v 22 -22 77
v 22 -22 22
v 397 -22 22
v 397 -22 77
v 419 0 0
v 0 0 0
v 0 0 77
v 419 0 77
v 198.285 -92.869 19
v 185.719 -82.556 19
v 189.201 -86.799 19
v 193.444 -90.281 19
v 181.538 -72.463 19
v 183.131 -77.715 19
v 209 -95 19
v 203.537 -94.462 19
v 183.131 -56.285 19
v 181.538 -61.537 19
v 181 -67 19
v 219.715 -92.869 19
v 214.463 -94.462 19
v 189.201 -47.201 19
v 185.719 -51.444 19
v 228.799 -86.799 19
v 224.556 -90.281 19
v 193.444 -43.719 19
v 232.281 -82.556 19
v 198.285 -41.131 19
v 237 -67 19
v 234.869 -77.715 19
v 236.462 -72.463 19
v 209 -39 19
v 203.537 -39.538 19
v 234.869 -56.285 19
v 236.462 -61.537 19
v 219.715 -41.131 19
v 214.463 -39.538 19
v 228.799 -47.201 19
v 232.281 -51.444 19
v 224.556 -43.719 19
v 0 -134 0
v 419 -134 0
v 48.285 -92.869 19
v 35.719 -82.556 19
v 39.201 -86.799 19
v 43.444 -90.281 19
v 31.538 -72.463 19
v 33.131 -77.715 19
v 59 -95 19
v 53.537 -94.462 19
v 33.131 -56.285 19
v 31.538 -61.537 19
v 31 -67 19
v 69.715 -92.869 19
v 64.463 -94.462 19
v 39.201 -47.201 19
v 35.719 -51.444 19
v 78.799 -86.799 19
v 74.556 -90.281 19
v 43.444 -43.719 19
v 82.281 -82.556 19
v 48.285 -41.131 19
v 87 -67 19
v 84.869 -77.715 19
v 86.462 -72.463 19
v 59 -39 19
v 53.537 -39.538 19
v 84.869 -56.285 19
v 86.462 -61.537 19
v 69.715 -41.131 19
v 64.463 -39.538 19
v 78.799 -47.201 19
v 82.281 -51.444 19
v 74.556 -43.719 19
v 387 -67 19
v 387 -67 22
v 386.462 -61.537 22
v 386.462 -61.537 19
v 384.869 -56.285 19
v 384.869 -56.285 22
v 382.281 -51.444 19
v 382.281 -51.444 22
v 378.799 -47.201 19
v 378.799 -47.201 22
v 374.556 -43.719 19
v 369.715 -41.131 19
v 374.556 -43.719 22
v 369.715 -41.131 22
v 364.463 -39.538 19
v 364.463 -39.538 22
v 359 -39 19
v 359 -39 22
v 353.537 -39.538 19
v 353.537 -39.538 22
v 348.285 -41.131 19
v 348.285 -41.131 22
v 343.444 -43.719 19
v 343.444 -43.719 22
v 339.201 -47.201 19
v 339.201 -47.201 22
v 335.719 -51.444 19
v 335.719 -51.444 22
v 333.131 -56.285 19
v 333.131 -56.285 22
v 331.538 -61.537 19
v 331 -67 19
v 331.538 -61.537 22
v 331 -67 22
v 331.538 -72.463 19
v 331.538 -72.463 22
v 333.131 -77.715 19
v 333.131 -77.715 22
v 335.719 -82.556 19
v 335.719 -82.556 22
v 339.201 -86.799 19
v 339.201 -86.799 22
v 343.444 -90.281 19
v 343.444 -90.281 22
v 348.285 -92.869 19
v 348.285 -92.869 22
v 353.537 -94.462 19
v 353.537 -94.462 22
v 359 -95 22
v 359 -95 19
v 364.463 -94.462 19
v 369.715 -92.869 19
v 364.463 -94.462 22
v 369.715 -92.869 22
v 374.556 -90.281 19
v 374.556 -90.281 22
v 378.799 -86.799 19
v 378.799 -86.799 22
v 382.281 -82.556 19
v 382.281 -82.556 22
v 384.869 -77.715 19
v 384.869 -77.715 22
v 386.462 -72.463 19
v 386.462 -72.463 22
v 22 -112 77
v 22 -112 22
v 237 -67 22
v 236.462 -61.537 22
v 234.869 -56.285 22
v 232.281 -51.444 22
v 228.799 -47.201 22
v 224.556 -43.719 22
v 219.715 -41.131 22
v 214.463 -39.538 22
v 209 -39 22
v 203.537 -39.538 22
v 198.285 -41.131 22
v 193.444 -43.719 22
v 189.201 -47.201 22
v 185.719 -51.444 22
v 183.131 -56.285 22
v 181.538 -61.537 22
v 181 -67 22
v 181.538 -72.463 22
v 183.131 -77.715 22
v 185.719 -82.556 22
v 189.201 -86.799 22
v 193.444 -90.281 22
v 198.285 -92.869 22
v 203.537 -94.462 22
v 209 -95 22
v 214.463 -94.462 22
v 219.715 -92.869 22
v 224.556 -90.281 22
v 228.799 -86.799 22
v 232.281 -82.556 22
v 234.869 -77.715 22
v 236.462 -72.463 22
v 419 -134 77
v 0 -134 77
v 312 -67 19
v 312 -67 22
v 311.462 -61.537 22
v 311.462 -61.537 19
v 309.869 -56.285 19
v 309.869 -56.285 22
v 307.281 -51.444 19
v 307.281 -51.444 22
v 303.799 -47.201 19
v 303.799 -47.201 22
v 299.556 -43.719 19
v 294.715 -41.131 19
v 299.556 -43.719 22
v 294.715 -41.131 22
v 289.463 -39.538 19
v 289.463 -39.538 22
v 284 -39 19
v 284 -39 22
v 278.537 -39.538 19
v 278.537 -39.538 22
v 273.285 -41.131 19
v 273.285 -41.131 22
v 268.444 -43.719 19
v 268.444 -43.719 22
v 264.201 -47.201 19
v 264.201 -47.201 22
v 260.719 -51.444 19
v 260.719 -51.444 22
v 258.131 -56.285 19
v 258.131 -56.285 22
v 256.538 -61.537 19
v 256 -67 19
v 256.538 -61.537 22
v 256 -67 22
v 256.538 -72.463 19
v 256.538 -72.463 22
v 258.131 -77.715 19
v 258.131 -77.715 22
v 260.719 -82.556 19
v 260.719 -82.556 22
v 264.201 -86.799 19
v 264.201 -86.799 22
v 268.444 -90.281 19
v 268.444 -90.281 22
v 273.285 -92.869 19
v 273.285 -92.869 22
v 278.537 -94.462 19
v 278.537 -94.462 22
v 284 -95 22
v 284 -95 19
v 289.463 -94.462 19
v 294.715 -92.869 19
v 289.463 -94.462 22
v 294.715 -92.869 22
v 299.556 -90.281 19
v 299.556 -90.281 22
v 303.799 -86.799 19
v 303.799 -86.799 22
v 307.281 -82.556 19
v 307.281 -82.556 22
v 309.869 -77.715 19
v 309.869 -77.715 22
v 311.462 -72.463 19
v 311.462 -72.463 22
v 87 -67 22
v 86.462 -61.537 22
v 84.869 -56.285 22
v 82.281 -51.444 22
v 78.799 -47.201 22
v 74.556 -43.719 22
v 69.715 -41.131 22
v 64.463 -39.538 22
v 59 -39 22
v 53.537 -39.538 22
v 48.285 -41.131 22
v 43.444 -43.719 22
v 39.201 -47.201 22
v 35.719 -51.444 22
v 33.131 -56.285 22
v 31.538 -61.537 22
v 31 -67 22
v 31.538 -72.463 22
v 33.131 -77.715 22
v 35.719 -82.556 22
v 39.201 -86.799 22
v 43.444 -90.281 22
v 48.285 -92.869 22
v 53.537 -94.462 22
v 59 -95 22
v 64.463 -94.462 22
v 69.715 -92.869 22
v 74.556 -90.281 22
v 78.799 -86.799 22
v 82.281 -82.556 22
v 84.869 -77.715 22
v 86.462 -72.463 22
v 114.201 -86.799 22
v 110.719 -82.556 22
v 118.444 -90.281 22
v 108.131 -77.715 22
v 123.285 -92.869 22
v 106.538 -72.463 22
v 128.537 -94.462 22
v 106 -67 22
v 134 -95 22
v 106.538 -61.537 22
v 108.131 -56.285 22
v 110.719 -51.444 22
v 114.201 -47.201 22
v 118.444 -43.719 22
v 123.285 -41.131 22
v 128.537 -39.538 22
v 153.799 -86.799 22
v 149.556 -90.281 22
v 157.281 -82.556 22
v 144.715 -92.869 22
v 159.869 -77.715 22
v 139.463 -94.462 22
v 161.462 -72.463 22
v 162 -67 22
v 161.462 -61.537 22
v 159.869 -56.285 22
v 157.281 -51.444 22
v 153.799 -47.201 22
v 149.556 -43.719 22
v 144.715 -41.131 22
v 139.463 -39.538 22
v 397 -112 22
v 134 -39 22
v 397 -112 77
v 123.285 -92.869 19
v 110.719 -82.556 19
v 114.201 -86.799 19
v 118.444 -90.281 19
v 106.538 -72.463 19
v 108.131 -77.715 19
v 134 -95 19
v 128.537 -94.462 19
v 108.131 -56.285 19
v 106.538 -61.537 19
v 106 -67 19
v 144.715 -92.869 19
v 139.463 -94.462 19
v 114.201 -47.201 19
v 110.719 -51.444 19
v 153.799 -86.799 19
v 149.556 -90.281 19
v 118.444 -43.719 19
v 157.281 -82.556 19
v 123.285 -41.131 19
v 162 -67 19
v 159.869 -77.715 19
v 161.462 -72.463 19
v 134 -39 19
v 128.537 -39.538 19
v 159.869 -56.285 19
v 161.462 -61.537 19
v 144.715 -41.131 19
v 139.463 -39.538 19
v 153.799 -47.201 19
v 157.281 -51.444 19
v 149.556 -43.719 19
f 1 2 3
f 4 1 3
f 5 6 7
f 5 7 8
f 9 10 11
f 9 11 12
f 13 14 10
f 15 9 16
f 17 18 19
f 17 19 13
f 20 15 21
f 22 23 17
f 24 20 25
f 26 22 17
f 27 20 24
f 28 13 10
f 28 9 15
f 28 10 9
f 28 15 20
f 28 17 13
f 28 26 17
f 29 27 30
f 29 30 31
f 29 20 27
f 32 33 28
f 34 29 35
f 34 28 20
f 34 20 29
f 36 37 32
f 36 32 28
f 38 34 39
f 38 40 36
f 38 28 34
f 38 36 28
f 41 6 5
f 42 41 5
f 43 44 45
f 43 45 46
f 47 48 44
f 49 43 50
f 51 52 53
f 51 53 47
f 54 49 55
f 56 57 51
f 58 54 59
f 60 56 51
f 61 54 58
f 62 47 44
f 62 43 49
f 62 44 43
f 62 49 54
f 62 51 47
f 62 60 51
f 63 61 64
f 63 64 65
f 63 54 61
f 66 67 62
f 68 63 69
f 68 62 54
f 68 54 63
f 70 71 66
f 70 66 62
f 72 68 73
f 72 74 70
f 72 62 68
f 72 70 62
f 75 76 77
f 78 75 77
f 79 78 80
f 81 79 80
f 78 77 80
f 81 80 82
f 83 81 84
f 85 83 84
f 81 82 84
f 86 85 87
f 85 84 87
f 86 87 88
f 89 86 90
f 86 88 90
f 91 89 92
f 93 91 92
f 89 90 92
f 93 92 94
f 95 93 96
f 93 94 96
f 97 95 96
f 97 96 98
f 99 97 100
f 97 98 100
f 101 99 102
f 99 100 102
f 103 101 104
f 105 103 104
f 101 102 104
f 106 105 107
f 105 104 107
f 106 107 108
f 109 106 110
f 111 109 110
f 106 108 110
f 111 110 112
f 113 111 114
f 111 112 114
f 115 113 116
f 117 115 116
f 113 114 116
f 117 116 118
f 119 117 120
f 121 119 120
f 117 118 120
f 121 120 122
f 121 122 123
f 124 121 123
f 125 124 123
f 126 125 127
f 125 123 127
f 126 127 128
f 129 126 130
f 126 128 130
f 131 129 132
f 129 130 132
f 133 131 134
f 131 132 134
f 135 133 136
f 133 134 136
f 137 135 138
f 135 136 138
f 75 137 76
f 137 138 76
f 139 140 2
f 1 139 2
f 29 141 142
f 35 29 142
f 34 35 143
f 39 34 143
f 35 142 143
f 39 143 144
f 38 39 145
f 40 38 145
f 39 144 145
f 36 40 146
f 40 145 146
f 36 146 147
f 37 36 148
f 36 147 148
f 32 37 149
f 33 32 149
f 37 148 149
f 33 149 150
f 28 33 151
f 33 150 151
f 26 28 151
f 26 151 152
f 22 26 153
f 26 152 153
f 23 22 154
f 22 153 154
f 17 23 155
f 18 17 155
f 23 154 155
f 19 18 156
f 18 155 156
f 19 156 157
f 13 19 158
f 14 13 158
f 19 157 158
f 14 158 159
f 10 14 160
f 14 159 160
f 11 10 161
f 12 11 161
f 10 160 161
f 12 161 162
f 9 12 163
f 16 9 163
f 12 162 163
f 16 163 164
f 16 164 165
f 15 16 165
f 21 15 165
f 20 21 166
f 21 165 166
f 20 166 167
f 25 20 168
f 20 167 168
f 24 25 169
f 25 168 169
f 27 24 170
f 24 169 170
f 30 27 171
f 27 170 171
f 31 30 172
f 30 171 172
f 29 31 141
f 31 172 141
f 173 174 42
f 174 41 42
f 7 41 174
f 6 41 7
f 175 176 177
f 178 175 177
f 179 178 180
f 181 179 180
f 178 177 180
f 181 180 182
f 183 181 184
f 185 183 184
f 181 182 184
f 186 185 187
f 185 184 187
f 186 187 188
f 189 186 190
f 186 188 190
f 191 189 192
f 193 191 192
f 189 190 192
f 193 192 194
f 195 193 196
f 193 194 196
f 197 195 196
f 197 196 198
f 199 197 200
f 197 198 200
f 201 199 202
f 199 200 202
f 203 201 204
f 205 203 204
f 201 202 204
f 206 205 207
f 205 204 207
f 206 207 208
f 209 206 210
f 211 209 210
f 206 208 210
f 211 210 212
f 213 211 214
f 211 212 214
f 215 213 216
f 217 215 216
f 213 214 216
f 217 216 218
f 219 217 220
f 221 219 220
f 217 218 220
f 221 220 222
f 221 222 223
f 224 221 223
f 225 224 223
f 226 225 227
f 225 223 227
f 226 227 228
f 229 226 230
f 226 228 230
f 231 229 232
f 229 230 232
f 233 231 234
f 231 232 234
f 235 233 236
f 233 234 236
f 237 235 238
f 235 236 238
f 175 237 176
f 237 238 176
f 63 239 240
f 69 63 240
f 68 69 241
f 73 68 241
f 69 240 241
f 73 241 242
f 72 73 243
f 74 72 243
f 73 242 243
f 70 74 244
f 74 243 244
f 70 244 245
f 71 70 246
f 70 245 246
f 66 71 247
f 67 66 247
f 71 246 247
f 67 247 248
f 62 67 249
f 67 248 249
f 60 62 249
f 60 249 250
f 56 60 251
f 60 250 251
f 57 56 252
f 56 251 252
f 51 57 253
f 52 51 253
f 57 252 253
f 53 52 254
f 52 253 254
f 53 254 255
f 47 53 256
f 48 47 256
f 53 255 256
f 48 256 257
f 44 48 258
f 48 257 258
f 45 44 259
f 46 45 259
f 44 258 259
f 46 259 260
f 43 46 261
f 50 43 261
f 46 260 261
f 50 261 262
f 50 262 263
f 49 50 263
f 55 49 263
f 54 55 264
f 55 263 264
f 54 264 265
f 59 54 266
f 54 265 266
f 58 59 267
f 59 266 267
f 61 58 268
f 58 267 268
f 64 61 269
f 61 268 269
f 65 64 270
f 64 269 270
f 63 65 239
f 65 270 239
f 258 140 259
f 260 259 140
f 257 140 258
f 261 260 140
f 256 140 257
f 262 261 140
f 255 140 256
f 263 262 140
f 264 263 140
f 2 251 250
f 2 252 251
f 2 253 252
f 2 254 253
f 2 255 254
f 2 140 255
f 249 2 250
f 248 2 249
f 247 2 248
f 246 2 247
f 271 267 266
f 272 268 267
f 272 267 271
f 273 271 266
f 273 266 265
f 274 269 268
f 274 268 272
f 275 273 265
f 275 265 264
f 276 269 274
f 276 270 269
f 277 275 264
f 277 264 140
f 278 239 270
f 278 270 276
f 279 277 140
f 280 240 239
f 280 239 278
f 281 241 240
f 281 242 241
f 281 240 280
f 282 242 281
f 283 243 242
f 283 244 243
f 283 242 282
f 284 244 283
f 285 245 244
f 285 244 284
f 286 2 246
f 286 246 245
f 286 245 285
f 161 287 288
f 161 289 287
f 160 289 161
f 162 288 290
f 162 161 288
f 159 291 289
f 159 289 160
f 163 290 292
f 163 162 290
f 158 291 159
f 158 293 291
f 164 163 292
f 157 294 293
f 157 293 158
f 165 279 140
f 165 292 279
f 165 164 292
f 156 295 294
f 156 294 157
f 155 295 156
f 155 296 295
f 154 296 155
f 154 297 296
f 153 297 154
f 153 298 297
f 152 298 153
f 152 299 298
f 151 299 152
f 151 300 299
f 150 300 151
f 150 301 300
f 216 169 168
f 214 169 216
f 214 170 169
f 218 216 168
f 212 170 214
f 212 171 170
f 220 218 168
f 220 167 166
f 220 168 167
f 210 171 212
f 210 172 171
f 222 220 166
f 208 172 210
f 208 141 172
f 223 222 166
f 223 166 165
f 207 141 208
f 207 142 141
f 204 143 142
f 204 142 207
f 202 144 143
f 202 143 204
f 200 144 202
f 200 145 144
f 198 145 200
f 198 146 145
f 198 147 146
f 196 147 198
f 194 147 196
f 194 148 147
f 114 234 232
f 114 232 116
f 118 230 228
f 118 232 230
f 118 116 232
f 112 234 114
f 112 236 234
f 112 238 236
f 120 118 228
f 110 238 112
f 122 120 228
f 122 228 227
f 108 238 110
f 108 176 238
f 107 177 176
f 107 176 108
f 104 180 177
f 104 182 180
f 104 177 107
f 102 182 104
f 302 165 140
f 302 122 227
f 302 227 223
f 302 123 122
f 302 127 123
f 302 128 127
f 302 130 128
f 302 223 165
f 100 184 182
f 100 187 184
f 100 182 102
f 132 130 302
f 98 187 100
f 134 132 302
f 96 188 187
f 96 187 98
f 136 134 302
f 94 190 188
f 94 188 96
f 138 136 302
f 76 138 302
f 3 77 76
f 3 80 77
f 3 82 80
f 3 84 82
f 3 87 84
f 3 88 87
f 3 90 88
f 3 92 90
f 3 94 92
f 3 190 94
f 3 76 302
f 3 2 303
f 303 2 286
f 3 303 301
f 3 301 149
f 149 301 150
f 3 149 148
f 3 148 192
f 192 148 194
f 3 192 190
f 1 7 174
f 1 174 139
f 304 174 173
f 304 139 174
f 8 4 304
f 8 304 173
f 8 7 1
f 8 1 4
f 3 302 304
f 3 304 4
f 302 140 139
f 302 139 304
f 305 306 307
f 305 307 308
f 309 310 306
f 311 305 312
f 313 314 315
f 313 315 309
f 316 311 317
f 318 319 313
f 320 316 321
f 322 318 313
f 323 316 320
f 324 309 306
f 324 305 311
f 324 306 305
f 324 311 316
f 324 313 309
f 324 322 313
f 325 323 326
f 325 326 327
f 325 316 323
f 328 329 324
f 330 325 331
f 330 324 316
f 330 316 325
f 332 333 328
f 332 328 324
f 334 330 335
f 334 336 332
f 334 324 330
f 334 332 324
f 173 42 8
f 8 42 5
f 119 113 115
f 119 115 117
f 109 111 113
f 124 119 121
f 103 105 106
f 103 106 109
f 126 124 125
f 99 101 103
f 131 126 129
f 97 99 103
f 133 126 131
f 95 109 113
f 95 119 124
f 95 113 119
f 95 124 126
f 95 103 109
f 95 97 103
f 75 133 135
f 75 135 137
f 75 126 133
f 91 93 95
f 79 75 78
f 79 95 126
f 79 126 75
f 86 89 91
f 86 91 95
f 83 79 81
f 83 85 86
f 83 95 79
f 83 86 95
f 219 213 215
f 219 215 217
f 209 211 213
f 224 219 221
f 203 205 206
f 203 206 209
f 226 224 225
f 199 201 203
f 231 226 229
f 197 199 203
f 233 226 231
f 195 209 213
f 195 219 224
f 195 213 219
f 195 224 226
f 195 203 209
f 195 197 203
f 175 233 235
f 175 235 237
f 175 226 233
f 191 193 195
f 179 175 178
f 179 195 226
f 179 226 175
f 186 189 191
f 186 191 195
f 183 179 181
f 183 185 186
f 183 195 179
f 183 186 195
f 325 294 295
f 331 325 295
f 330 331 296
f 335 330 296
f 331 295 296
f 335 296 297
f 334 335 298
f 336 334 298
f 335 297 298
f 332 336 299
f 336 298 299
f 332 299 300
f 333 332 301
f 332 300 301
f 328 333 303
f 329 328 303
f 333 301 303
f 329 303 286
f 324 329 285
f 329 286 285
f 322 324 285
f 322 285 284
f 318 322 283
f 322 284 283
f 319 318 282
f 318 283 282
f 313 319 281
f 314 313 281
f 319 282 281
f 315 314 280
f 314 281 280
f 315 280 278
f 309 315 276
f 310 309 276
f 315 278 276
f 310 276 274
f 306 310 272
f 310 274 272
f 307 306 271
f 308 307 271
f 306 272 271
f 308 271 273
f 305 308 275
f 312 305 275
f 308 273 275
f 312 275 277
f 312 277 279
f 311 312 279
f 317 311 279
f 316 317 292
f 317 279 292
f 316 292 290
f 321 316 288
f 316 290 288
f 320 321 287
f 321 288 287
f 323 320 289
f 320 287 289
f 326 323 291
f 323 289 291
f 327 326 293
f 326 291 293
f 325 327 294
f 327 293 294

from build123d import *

# Parameters (mm, degrees)
ESQUISSE1_W             = 419
ESQUISSE1_H             = 134
BOSS_EXTRU_1_DEPTH      = 22
ESQUISSE3_W             = 419
ESQUISSE3_H             = 134
ESQUISSE3_W_2           = 375
ESQUISSE3_H_2           = 90
BOSS_EXTRU_2_DEPTH      = 55
ESQUISSE4_R             = 28
ENL_V_MAT_EXTRU_1_DEPTH = 3


with BuildPart() as part:
    # Esquisse1 → Boss.-Extru.1 (new body)
    with BuildSketch(Plane.XY):
        with Locations((209.5, -67)):
            Rectangle(ESQUISSE1_W, ESQUISSE1_H)
    extrude(amount=BOSS_EXTRU_1_DEPTH)

    # Esquisse3 → Boss.-Extru.2 (add)
    with BuildSketch(Plane.XY.offset(22)):
        with Locations((209.5, -67)):
            Rectangle(ESQUISSE3_W, ESQUISSE3_H)
        with Locations((209.5, -67)):
            Rectangle(ESQUISSE3_W_2, ESQUISSE3_H_2, mode=Mode.SUBTRACT)
    extrude(amount=BOSS_EXTRU_2_DEPTH)

    # Esquisse4 → Enlèv. mat.-Extru.1 (cut)
    with BuildSketch(Plane.XY.offset(22)):
        with Locations((59, -67)):
            Circle(ESQUISSE4_R)
        with Locations((134, -67)):
            Circle(ESQUISSE4_R)
        with Locations((209, -67)):
            Circle(ESQUISSE4_R)
        with Locations((284, -67)):
            Circle(ESQUISSE4_R)
        with Locations((359, -67)):
            Circle(ESQUISSE4_R)
    extrude(amount=-ENL_V_MAT_EXTRU_1_DEPTH, mode=Mode.SUBTRACT)


solid = part.part
